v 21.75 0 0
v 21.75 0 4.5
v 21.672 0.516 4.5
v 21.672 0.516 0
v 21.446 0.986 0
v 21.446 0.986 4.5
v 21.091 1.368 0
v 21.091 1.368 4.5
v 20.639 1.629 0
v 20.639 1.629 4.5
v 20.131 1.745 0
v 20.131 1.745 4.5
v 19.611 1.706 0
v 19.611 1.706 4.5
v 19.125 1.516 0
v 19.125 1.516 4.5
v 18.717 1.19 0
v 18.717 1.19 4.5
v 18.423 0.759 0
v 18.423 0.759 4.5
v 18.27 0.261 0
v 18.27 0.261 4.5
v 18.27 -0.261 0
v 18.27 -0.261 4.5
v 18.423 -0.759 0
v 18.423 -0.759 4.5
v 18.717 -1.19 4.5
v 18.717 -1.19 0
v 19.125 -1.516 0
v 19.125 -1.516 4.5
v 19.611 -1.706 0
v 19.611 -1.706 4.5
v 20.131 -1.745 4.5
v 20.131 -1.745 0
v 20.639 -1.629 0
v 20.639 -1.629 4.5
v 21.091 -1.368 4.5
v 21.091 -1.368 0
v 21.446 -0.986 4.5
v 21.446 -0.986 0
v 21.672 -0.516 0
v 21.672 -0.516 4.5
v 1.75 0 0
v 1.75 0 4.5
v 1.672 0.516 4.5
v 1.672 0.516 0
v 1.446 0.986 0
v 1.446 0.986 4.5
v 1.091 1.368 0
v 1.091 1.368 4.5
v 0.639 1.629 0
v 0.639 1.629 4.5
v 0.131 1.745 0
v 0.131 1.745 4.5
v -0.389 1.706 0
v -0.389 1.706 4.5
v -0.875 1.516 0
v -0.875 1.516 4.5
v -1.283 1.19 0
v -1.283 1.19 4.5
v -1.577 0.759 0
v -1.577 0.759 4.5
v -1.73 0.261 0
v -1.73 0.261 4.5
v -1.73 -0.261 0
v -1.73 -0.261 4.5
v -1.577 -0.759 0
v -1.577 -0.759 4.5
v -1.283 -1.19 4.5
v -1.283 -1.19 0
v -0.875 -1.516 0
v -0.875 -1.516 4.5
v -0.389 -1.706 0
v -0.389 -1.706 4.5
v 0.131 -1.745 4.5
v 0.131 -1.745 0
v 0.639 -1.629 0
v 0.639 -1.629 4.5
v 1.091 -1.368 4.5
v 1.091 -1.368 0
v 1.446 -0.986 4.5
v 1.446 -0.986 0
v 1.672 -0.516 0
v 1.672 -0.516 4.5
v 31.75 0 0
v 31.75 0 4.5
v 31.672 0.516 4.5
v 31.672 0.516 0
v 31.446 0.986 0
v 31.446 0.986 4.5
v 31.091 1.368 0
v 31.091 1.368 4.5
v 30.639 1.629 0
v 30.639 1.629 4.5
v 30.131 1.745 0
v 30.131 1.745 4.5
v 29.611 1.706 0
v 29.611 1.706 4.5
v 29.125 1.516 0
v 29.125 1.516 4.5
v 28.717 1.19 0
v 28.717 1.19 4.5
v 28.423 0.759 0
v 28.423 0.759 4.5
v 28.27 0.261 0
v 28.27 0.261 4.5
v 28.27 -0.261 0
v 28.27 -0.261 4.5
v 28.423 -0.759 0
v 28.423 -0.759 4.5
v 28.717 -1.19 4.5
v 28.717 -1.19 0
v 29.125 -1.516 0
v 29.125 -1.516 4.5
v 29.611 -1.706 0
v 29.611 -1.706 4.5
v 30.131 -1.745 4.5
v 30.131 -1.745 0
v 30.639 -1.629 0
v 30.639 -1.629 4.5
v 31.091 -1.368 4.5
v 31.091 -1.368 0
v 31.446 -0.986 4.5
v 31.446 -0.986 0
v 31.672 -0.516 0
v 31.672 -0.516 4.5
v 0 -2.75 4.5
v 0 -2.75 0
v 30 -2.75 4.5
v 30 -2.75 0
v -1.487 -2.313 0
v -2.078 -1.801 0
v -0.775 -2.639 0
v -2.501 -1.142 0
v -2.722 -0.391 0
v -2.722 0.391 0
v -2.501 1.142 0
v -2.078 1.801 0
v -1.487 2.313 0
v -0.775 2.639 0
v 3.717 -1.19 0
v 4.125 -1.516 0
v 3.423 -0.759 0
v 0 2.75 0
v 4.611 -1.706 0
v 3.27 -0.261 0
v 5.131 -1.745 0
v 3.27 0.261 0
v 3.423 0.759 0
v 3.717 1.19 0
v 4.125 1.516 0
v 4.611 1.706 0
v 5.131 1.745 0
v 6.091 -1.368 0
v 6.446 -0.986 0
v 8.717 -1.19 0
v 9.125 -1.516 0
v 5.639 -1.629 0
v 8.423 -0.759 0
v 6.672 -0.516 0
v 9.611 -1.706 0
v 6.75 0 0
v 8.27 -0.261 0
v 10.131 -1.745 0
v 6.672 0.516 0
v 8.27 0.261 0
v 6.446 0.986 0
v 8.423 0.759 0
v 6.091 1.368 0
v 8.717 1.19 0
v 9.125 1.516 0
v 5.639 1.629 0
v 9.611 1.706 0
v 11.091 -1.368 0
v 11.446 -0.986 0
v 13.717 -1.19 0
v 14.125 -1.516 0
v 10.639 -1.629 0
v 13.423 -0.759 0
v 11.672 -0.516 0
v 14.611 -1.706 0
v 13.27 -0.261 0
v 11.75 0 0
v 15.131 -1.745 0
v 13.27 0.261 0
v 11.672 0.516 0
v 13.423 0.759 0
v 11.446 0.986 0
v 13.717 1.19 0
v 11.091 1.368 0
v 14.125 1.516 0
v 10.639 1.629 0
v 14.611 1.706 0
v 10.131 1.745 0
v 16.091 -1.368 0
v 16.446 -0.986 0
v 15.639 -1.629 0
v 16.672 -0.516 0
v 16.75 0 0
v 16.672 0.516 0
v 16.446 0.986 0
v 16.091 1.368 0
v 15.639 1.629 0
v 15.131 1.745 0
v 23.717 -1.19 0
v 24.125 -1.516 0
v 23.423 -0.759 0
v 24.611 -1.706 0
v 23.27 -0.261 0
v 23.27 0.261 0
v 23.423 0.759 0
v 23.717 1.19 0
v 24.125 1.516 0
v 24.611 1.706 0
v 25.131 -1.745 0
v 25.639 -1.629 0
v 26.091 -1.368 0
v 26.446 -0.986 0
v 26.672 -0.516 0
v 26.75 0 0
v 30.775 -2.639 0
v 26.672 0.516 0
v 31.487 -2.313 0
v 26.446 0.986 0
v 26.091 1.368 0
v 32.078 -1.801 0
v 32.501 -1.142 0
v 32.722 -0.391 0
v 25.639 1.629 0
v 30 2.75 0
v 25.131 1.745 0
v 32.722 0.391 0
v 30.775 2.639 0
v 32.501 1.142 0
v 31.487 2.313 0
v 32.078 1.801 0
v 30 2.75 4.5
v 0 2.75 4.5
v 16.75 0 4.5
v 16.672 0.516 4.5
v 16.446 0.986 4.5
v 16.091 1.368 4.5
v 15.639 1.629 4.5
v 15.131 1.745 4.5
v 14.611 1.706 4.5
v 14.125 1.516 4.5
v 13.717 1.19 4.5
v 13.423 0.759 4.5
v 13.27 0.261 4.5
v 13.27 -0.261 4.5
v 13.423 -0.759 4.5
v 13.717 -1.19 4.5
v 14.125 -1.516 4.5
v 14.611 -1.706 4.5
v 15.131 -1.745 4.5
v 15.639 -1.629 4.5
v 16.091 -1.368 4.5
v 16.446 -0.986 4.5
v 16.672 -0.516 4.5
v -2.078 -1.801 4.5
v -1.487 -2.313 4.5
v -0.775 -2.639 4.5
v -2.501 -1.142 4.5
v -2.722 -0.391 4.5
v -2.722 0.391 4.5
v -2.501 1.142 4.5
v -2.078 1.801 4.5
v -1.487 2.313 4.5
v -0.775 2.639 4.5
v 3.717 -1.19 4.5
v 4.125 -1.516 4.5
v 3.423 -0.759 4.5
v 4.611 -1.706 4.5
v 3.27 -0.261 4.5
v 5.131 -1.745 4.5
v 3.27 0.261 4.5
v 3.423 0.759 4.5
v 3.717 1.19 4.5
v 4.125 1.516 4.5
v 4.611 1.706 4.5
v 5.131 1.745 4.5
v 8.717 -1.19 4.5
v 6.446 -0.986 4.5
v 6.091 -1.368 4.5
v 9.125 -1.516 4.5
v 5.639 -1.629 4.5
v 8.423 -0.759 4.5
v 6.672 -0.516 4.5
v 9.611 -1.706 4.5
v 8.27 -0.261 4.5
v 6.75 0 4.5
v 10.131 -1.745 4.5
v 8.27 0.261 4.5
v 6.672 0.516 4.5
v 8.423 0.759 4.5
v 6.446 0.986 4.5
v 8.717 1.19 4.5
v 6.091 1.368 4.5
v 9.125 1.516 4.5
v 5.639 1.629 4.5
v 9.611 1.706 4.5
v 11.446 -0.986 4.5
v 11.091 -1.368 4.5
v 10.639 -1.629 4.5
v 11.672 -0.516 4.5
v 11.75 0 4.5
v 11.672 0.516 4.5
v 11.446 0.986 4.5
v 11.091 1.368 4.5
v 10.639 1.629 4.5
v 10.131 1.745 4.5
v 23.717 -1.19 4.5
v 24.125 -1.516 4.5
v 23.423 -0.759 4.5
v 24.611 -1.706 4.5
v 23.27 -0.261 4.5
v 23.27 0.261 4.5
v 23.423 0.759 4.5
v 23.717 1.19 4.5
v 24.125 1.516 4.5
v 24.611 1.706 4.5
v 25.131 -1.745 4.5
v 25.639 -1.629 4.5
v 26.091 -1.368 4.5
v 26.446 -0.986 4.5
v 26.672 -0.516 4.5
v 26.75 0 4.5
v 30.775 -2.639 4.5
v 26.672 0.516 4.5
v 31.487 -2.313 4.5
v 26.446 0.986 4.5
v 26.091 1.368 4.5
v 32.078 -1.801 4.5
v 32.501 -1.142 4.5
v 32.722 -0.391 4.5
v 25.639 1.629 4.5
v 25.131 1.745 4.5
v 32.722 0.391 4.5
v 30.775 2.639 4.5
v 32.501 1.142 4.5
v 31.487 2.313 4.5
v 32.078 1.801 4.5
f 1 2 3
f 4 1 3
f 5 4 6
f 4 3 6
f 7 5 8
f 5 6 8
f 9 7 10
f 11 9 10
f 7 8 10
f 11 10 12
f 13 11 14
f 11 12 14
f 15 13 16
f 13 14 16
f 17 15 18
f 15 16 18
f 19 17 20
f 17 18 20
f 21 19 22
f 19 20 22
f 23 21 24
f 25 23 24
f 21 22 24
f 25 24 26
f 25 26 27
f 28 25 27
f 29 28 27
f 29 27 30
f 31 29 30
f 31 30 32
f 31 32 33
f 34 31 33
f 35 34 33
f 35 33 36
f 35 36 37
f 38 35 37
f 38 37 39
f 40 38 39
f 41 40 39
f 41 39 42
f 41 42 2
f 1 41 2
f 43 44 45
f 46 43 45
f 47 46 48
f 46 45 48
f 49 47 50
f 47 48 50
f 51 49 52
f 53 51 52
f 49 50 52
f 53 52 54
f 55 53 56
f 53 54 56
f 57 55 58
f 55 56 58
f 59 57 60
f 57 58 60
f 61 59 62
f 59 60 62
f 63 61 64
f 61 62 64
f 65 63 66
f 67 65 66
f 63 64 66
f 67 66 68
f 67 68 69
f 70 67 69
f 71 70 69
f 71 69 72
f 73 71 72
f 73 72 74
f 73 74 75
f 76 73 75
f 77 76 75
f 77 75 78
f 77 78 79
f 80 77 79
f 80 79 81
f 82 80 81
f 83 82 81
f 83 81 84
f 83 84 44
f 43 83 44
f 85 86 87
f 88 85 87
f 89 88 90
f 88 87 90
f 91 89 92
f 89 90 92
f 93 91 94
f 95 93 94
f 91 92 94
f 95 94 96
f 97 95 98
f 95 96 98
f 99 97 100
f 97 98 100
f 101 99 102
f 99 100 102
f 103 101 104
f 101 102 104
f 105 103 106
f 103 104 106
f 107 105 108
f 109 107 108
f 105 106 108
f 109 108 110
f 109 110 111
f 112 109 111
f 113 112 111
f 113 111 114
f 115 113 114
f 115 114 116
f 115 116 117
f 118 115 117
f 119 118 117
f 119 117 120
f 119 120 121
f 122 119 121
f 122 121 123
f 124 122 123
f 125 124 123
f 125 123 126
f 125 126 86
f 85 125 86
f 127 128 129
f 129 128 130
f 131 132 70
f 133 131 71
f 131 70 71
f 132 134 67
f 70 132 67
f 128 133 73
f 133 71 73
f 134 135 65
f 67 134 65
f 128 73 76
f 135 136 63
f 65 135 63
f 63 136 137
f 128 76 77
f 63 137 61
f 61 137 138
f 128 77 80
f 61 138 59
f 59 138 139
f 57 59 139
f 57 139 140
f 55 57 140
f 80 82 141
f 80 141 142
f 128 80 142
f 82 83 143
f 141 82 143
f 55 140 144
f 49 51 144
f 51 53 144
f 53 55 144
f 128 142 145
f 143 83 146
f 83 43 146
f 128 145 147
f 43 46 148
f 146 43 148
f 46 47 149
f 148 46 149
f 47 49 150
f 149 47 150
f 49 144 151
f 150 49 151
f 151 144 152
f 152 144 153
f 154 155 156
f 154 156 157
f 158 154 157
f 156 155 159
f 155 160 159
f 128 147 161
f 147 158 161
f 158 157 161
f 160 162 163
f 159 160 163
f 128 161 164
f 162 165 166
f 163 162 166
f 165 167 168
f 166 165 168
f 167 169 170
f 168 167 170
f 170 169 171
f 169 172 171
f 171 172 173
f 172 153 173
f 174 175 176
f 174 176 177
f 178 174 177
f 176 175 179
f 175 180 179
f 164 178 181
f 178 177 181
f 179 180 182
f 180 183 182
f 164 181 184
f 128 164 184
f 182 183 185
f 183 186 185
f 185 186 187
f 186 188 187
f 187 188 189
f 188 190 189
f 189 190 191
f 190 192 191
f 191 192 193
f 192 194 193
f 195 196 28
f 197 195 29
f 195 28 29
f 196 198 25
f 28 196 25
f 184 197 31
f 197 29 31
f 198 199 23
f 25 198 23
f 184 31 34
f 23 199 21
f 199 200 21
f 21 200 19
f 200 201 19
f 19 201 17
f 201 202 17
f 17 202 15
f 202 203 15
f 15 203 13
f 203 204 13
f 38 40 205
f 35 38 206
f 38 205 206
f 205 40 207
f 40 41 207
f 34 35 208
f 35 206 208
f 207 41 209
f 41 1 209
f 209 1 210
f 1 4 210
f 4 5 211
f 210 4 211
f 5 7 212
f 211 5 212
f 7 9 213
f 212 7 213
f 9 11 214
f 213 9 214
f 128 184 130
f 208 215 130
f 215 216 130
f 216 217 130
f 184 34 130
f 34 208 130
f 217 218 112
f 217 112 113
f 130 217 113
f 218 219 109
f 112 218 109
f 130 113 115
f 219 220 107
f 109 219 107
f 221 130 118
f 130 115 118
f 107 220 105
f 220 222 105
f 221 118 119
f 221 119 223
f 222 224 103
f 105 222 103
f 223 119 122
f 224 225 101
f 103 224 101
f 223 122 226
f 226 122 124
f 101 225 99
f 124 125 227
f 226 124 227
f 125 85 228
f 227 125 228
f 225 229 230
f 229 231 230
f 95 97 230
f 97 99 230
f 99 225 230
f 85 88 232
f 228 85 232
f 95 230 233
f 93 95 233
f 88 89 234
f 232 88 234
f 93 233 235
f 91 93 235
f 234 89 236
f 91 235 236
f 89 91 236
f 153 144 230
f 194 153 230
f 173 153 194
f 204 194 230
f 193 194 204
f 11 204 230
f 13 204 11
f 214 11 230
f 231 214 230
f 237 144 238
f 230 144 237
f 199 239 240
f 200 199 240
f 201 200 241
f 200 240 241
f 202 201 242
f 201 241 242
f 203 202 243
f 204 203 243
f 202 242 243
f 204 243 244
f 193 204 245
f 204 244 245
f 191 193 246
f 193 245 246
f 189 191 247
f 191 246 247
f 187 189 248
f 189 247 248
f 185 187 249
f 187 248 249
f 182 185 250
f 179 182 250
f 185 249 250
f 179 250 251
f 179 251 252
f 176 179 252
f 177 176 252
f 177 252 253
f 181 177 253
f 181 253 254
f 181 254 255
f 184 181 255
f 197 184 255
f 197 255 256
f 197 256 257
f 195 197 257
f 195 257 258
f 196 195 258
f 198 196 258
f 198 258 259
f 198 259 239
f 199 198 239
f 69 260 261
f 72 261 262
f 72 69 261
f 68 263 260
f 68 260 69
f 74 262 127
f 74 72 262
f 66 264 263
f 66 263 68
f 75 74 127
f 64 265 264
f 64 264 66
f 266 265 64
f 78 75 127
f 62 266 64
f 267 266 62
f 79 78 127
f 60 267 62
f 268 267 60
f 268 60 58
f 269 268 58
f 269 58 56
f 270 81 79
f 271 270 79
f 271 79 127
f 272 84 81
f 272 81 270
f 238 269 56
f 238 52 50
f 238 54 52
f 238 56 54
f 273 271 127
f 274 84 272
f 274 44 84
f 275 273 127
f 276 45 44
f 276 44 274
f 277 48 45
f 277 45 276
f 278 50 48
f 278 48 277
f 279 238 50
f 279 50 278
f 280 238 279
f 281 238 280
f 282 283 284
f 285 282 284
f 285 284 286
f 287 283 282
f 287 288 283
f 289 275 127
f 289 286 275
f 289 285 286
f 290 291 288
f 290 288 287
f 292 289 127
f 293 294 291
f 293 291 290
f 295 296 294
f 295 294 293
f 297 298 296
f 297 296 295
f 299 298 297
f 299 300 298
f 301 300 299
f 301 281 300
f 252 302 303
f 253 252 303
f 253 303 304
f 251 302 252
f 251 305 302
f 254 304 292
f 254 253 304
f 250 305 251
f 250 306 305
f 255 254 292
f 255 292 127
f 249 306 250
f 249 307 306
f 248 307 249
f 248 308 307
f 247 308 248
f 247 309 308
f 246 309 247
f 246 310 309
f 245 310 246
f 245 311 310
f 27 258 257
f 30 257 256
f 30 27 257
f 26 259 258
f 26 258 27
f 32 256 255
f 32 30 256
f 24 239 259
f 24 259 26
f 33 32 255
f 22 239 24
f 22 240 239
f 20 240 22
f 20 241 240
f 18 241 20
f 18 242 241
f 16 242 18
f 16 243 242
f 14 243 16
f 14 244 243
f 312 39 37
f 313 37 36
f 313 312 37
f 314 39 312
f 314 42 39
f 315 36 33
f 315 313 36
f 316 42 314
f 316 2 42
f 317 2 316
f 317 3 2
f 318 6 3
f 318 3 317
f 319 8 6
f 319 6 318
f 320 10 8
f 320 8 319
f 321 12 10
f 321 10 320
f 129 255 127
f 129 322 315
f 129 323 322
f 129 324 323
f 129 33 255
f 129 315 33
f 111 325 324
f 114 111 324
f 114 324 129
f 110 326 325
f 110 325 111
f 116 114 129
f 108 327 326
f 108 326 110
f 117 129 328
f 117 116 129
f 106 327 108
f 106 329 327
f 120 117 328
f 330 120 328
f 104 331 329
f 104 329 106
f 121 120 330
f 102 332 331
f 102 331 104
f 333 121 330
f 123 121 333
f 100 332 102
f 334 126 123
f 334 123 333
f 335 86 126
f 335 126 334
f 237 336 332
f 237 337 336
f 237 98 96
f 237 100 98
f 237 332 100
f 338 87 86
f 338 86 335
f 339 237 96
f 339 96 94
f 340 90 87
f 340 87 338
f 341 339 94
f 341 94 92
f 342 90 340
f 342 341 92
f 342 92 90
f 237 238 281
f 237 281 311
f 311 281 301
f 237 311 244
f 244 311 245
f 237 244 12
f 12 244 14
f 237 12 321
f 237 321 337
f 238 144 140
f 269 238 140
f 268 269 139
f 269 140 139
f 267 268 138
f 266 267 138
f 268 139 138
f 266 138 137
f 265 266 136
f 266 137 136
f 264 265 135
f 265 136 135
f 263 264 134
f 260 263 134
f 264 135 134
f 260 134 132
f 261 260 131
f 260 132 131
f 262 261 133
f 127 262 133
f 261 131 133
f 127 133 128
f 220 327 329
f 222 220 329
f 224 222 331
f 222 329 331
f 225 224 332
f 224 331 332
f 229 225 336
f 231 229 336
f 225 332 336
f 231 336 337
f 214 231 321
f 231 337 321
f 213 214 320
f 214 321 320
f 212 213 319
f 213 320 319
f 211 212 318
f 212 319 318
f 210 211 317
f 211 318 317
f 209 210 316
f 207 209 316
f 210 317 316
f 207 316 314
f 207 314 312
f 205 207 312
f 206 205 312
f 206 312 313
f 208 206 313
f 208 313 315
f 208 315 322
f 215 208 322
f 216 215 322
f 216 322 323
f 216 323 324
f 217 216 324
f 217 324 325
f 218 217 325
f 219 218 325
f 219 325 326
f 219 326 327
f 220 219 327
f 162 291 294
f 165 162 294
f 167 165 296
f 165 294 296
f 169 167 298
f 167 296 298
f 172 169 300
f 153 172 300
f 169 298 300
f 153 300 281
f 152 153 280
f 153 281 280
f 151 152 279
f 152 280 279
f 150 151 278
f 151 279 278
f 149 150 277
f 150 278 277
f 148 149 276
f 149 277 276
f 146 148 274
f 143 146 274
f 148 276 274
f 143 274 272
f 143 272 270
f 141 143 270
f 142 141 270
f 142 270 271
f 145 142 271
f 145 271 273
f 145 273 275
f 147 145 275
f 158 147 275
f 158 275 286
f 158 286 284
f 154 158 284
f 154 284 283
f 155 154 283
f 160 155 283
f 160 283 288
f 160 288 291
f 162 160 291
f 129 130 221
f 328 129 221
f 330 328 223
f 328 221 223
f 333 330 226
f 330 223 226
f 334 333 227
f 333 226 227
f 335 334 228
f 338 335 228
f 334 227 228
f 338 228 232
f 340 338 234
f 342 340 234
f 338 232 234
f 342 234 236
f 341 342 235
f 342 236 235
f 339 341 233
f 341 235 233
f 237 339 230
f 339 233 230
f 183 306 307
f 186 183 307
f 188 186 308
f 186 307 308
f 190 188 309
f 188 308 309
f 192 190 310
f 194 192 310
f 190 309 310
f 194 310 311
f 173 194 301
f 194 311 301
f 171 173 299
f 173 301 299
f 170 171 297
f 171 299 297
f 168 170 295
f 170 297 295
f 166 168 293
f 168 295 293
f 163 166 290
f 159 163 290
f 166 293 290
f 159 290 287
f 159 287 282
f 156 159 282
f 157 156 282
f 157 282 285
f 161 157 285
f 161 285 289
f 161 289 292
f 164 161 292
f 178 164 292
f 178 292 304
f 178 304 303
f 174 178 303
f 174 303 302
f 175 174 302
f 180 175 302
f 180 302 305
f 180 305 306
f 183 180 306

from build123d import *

# Parameters (mm, degrees)
PAD_DEPTH           = 4.5
SKETCH001_R         = 1.75
POCKET_DEPTH        = 4.501
LINEARPATTERN_COUNT = 7
LINEARPATTERN_PITCH = 5


with BuildPart() as part:
    # Sketch → Pad (new body)
    with BuildSketch(Plane.XY):
        with BuildLine():
            ThreePointArc((1.4e-05, 2.75), (-2.75, 7e-06), (0, -2.75))
            Line((0, -2.75), (30, -2.75))
            ThreePointArc((30, -2.75), (32.75, -7e-06), (30.000014, 2.75))
            Line((1.4e-05, 2.75), (30.000014, 2.75))
        make_face()
    extrude(amount=PAD_DEPTH)

    # Sketch001 → Pocket (cut, through all)
    with BuildSketch(Plane.XY.offset(4.5)):
        Circle(SKETCH001_R)
    pocket = extrude(amount=-POCKET_DEPTH, mode=Mode.SUBTRACT)

    # LinearPattern: Pocket ×7
    with Locations(*[(i * LINEARPATTERN_PITCH, 0, 0) for i in range(1, LINEARPATTERN_COUNT)]):
        add(pocket, mode=Mode.SUBTRACT)


solid = part.part
